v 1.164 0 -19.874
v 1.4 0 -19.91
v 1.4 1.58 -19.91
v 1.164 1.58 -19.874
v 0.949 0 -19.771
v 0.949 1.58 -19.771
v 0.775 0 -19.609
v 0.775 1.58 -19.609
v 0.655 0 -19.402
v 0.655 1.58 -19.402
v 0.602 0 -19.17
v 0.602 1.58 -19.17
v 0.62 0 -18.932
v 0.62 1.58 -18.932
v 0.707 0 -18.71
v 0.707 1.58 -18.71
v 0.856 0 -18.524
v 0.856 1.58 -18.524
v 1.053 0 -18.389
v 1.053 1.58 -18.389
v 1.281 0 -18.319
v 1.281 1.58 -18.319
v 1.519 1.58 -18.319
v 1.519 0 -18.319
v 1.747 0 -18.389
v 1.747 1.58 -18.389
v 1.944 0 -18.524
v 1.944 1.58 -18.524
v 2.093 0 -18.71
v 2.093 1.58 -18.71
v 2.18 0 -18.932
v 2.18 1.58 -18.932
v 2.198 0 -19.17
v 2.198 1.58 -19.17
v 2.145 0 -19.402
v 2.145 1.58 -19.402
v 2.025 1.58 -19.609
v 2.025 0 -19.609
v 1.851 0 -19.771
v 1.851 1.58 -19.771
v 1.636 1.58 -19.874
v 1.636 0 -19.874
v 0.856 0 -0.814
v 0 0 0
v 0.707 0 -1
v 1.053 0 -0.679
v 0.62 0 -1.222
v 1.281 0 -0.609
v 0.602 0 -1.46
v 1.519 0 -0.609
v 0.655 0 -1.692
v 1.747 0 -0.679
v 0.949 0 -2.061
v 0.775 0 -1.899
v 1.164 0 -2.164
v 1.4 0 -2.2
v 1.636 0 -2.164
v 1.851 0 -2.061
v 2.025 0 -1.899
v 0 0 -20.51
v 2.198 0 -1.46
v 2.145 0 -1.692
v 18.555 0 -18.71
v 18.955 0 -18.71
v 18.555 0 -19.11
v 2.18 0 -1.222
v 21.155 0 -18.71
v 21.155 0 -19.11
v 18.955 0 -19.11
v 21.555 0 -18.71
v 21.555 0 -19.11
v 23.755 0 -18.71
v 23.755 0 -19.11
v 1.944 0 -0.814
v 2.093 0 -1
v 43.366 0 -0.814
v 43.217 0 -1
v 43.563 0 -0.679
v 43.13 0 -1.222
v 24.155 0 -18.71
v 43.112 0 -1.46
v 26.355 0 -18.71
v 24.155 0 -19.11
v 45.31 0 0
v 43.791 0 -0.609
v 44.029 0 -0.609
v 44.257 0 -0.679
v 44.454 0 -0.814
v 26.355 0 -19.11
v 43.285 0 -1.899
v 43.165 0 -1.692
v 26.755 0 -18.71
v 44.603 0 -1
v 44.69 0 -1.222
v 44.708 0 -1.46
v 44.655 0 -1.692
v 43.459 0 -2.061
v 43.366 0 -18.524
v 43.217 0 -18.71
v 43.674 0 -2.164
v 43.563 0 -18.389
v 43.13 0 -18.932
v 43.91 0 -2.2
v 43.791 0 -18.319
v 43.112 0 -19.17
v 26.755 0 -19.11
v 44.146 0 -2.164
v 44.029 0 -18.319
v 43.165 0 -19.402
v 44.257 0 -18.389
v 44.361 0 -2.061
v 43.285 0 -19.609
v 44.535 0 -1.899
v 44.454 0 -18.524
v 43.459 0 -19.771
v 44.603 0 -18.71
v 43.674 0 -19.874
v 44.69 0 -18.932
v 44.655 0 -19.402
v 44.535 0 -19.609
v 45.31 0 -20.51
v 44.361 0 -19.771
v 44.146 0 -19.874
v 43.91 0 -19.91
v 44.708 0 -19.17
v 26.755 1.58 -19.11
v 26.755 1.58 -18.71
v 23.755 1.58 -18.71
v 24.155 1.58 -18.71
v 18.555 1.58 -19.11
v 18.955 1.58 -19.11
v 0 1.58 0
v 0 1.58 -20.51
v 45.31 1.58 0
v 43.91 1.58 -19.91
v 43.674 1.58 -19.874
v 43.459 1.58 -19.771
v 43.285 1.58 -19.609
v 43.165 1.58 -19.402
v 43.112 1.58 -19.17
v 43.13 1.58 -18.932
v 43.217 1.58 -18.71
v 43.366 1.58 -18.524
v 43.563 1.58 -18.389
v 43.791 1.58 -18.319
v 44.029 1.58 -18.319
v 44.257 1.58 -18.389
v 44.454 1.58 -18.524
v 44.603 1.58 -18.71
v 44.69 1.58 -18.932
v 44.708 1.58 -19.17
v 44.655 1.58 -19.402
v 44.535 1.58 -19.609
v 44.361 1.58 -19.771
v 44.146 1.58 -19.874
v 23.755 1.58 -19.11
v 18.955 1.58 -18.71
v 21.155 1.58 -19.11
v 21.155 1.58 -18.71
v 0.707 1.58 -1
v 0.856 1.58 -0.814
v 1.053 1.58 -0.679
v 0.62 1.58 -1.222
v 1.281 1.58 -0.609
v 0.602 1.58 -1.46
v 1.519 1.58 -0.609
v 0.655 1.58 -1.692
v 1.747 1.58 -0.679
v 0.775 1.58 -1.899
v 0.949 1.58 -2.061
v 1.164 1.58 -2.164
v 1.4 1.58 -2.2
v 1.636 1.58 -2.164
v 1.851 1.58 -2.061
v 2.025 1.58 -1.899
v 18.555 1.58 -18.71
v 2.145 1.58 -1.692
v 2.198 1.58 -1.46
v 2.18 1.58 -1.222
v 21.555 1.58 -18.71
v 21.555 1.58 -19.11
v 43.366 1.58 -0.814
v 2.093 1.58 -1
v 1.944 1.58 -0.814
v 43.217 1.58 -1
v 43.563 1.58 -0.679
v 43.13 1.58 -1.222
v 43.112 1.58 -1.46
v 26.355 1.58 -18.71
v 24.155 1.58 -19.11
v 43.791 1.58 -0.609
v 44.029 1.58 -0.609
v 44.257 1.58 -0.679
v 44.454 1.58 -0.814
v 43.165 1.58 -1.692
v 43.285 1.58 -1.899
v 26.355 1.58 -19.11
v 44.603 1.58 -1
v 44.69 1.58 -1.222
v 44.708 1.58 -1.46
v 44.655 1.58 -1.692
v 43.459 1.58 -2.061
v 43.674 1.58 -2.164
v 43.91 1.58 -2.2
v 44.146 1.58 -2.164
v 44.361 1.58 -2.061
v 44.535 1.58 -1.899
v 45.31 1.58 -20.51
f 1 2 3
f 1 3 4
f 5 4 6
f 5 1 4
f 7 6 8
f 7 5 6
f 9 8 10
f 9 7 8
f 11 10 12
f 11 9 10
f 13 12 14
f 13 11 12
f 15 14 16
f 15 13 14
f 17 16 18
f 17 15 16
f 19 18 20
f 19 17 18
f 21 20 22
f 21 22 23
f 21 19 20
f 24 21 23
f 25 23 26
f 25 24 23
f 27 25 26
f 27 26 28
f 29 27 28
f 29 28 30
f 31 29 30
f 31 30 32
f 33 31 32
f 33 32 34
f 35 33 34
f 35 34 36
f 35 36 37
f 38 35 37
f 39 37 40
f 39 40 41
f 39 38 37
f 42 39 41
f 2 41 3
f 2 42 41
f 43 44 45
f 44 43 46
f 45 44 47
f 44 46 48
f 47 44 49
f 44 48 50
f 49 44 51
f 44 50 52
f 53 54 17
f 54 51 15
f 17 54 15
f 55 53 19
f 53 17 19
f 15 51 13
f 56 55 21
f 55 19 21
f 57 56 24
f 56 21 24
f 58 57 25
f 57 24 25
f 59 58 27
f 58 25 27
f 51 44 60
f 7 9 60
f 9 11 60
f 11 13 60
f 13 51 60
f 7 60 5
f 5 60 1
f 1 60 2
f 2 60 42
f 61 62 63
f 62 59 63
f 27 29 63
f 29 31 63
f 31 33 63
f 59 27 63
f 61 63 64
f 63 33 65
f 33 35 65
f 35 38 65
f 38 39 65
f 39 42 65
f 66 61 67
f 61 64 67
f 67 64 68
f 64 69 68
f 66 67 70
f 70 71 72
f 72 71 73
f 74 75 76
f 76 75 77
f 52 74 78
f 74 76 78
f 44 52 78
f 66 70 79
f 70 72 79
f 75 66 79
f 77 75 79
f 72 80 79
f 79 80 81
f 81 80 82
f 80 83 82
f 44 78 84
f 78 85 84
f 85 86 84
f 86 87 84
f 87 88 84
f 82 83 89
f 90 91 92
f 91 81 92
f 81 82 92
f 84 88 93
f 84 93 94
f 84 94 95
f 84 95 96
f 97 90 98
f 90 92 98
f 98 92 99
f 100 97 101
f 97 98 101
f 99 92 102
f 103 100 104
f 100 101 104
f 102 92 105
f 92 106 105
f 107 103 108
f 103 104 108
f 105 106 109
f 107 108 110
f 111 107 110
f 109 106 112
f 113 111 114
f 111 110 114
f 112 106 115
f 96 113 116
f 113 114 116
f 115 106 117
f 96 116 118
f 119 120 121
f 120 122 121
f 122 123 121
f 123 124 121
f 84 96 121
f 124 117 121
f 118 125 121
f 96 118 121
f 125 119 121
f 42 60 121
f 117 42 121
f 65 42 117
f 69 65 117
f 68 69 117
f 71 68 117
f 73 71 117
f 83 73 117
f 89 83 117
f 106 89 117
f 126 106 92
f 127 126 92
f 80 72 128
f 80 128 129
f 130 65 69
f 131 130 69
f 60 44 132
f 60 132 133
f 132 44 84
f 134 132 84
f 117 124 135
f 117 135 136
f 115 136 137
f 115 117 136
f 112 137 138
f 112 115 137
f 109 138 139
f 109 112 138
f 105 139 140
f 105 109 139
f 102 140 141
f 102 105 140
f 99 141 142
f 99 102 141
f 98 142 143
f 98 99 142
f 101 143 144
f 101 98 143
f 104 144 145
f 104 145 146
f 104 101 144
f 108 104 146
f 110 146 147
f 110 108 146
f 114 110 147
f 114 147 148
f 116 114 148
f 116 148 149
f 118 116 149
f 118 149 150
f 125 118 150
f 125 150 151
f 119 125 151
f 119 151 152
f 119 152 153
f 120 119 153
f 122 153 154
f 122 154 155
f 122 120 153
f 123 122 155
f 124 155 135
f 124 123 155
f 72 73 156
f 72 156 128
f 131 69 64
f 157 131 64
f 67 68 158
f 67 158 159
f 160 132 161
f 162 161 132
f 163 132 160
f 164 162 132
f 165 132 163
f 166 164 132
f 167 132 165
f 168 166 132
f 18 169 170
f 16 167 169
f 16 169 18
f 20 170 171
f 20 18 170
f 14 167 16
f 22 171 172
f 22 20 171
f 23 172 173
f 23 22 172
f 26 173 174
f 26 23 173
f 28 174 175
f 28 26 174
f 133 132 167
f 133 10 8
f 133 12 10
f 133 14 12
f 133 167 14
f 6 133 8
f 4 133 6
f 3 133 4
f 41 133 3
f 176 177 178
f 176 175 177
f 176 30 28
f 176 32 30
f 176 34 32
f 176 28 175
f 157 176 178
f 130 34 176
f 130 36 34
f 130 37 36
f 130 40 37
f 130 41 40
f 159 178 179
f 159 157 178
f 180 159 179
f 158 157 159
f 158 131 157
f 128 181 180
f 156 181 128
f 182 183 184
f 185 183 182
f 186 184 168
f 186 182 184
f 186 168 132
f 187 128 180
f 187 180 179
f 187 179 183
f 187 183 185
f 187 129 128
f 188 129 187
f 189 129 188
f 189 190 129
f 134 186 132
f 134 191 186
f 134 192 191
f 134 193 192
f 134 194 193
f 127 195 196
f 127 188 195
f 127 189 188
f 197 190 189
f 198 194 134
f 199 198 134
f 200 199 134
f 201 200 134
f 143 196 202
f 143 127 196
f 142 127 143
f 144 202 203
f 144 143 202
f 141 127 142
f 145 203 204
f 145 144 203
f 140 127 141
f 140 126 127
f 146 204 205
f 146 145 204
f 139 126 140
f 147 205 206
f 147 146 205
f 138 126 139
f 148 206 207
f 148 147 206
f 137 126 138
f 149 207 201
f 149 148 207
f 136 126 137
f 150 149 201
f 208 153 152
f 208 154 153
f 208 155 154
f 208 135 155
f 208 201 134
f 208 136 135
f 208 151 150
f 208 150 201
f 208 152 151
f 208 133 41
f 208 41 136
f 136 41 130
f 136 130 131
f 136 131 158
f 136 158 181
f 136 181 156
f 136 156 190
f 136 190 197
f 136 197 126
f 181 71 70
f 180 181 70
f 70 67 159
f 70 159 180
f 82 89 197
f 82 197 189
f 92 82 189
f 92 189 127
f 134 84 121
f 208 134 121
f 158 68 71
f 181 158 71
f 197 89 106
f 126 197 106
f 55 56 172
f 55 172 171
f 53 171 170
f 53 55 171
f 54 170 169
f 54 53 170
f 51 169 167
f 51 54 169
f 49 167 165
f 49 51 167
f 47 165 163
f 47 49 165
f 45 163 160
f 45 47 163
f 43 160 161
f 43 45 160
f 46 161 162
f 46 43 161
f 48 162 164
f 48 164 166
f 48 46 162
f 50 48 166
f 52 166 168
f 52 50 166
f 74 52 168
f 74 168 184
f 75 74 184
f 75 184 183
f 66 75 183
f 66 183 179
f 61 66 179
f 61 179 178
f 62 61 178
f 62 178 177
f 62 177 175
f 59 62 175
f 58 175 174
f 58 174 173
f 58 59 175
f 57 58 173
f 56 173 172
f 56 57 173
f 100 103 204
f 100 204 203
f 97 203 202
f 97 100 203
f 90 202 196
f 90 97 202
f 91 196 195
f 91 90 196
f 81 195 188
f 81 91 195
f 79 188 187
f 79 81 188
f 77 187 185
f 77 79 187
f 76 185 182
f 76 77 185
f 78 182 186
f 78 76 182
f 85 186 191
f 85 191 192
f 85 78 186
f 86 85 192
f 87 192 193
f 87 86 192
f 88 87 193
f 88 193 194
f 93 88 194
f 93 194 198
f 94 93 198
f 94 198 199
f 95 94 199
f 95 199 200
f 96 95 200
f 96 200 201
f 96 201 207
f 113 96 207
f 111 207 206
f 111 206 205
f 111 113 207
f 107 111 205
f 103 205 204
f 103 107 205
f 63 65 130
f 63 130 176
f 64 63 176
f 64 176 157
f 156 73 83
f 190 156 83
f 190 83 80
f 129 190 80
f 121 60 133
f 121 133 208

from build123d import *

# Parameters (mm, degrees)
CROQUIS1_W              = 45.31
CROQUIS1_H              = 20.51
CROQUIS1_R              = 0.8
SALIENTE_EXTRUIR1_DEPTH = 1.58
CROQUIS2_W              = 0.4
CROQUIS2_H              = 0.4
CORTAR_EXTRUIR1_DEPTH   = 50.760954573


with BuildPart() as part:
    # Croquis1 → Saliente-Extruir1 (new body)
    with BuildSketch(Plane(origin=(0, 0, 0), x_dir=(1, 0, 0), z_dir=(0, 1, 0))):
        with Locations((22.655, 10.255)):
            Rectangle(CROQUIS1_W, CROQUIS1_H)
        with Locations(Location((1.4, 19.11, 0), (0, 0, 90))):
            Circle(CROQUIS1_R, mode=Mode.SUBTRACT)
        with Locations(Location((43.91, 19.11, 0), (0, 0, 90))):
            Circle(CROQUIS1_R, mode=Mode.SUBTRACT)
        with Locations(Location((1.4, 1.4, 0), (0, 0, 90))):
            Circle(CROQUIS1_R, mode=Mode.SUBTRACT)
        with Locations(Location((43.91, 1.4, 0), (0, 0, 90))):
            Circle(CROQUIS1_R, mode=Mode.SUBTRACT)
    extrude(amount=SALIENTE_EXTRUIR1_DEPTH)

    # Croquis2 → Cortar-Extruir1 (cut, through all)
    with BuildSketch(Plane.XZ):
        with Locations((21.355, -18.91)):
            Rectangle(CROQUIS2_W, CROQUIS2_H)
        with Locations((18.755, -18.91)):
            Rectangle(CROQUIS2_W, CROQUIS2_H)
        with Locations((23.955, -18.91)):
            Rectangle(CROQUIS2_W, CROQUIS2_H)
        with Locations((26.555, -18.91)):
            Rectangle(CROQUIS2_W, CROQUIS2_H)
    extrude(amount=-CORTAR_EXTRUIR1_DEPTH, mode=Mode.SUBTRACT)


solid = part.part
